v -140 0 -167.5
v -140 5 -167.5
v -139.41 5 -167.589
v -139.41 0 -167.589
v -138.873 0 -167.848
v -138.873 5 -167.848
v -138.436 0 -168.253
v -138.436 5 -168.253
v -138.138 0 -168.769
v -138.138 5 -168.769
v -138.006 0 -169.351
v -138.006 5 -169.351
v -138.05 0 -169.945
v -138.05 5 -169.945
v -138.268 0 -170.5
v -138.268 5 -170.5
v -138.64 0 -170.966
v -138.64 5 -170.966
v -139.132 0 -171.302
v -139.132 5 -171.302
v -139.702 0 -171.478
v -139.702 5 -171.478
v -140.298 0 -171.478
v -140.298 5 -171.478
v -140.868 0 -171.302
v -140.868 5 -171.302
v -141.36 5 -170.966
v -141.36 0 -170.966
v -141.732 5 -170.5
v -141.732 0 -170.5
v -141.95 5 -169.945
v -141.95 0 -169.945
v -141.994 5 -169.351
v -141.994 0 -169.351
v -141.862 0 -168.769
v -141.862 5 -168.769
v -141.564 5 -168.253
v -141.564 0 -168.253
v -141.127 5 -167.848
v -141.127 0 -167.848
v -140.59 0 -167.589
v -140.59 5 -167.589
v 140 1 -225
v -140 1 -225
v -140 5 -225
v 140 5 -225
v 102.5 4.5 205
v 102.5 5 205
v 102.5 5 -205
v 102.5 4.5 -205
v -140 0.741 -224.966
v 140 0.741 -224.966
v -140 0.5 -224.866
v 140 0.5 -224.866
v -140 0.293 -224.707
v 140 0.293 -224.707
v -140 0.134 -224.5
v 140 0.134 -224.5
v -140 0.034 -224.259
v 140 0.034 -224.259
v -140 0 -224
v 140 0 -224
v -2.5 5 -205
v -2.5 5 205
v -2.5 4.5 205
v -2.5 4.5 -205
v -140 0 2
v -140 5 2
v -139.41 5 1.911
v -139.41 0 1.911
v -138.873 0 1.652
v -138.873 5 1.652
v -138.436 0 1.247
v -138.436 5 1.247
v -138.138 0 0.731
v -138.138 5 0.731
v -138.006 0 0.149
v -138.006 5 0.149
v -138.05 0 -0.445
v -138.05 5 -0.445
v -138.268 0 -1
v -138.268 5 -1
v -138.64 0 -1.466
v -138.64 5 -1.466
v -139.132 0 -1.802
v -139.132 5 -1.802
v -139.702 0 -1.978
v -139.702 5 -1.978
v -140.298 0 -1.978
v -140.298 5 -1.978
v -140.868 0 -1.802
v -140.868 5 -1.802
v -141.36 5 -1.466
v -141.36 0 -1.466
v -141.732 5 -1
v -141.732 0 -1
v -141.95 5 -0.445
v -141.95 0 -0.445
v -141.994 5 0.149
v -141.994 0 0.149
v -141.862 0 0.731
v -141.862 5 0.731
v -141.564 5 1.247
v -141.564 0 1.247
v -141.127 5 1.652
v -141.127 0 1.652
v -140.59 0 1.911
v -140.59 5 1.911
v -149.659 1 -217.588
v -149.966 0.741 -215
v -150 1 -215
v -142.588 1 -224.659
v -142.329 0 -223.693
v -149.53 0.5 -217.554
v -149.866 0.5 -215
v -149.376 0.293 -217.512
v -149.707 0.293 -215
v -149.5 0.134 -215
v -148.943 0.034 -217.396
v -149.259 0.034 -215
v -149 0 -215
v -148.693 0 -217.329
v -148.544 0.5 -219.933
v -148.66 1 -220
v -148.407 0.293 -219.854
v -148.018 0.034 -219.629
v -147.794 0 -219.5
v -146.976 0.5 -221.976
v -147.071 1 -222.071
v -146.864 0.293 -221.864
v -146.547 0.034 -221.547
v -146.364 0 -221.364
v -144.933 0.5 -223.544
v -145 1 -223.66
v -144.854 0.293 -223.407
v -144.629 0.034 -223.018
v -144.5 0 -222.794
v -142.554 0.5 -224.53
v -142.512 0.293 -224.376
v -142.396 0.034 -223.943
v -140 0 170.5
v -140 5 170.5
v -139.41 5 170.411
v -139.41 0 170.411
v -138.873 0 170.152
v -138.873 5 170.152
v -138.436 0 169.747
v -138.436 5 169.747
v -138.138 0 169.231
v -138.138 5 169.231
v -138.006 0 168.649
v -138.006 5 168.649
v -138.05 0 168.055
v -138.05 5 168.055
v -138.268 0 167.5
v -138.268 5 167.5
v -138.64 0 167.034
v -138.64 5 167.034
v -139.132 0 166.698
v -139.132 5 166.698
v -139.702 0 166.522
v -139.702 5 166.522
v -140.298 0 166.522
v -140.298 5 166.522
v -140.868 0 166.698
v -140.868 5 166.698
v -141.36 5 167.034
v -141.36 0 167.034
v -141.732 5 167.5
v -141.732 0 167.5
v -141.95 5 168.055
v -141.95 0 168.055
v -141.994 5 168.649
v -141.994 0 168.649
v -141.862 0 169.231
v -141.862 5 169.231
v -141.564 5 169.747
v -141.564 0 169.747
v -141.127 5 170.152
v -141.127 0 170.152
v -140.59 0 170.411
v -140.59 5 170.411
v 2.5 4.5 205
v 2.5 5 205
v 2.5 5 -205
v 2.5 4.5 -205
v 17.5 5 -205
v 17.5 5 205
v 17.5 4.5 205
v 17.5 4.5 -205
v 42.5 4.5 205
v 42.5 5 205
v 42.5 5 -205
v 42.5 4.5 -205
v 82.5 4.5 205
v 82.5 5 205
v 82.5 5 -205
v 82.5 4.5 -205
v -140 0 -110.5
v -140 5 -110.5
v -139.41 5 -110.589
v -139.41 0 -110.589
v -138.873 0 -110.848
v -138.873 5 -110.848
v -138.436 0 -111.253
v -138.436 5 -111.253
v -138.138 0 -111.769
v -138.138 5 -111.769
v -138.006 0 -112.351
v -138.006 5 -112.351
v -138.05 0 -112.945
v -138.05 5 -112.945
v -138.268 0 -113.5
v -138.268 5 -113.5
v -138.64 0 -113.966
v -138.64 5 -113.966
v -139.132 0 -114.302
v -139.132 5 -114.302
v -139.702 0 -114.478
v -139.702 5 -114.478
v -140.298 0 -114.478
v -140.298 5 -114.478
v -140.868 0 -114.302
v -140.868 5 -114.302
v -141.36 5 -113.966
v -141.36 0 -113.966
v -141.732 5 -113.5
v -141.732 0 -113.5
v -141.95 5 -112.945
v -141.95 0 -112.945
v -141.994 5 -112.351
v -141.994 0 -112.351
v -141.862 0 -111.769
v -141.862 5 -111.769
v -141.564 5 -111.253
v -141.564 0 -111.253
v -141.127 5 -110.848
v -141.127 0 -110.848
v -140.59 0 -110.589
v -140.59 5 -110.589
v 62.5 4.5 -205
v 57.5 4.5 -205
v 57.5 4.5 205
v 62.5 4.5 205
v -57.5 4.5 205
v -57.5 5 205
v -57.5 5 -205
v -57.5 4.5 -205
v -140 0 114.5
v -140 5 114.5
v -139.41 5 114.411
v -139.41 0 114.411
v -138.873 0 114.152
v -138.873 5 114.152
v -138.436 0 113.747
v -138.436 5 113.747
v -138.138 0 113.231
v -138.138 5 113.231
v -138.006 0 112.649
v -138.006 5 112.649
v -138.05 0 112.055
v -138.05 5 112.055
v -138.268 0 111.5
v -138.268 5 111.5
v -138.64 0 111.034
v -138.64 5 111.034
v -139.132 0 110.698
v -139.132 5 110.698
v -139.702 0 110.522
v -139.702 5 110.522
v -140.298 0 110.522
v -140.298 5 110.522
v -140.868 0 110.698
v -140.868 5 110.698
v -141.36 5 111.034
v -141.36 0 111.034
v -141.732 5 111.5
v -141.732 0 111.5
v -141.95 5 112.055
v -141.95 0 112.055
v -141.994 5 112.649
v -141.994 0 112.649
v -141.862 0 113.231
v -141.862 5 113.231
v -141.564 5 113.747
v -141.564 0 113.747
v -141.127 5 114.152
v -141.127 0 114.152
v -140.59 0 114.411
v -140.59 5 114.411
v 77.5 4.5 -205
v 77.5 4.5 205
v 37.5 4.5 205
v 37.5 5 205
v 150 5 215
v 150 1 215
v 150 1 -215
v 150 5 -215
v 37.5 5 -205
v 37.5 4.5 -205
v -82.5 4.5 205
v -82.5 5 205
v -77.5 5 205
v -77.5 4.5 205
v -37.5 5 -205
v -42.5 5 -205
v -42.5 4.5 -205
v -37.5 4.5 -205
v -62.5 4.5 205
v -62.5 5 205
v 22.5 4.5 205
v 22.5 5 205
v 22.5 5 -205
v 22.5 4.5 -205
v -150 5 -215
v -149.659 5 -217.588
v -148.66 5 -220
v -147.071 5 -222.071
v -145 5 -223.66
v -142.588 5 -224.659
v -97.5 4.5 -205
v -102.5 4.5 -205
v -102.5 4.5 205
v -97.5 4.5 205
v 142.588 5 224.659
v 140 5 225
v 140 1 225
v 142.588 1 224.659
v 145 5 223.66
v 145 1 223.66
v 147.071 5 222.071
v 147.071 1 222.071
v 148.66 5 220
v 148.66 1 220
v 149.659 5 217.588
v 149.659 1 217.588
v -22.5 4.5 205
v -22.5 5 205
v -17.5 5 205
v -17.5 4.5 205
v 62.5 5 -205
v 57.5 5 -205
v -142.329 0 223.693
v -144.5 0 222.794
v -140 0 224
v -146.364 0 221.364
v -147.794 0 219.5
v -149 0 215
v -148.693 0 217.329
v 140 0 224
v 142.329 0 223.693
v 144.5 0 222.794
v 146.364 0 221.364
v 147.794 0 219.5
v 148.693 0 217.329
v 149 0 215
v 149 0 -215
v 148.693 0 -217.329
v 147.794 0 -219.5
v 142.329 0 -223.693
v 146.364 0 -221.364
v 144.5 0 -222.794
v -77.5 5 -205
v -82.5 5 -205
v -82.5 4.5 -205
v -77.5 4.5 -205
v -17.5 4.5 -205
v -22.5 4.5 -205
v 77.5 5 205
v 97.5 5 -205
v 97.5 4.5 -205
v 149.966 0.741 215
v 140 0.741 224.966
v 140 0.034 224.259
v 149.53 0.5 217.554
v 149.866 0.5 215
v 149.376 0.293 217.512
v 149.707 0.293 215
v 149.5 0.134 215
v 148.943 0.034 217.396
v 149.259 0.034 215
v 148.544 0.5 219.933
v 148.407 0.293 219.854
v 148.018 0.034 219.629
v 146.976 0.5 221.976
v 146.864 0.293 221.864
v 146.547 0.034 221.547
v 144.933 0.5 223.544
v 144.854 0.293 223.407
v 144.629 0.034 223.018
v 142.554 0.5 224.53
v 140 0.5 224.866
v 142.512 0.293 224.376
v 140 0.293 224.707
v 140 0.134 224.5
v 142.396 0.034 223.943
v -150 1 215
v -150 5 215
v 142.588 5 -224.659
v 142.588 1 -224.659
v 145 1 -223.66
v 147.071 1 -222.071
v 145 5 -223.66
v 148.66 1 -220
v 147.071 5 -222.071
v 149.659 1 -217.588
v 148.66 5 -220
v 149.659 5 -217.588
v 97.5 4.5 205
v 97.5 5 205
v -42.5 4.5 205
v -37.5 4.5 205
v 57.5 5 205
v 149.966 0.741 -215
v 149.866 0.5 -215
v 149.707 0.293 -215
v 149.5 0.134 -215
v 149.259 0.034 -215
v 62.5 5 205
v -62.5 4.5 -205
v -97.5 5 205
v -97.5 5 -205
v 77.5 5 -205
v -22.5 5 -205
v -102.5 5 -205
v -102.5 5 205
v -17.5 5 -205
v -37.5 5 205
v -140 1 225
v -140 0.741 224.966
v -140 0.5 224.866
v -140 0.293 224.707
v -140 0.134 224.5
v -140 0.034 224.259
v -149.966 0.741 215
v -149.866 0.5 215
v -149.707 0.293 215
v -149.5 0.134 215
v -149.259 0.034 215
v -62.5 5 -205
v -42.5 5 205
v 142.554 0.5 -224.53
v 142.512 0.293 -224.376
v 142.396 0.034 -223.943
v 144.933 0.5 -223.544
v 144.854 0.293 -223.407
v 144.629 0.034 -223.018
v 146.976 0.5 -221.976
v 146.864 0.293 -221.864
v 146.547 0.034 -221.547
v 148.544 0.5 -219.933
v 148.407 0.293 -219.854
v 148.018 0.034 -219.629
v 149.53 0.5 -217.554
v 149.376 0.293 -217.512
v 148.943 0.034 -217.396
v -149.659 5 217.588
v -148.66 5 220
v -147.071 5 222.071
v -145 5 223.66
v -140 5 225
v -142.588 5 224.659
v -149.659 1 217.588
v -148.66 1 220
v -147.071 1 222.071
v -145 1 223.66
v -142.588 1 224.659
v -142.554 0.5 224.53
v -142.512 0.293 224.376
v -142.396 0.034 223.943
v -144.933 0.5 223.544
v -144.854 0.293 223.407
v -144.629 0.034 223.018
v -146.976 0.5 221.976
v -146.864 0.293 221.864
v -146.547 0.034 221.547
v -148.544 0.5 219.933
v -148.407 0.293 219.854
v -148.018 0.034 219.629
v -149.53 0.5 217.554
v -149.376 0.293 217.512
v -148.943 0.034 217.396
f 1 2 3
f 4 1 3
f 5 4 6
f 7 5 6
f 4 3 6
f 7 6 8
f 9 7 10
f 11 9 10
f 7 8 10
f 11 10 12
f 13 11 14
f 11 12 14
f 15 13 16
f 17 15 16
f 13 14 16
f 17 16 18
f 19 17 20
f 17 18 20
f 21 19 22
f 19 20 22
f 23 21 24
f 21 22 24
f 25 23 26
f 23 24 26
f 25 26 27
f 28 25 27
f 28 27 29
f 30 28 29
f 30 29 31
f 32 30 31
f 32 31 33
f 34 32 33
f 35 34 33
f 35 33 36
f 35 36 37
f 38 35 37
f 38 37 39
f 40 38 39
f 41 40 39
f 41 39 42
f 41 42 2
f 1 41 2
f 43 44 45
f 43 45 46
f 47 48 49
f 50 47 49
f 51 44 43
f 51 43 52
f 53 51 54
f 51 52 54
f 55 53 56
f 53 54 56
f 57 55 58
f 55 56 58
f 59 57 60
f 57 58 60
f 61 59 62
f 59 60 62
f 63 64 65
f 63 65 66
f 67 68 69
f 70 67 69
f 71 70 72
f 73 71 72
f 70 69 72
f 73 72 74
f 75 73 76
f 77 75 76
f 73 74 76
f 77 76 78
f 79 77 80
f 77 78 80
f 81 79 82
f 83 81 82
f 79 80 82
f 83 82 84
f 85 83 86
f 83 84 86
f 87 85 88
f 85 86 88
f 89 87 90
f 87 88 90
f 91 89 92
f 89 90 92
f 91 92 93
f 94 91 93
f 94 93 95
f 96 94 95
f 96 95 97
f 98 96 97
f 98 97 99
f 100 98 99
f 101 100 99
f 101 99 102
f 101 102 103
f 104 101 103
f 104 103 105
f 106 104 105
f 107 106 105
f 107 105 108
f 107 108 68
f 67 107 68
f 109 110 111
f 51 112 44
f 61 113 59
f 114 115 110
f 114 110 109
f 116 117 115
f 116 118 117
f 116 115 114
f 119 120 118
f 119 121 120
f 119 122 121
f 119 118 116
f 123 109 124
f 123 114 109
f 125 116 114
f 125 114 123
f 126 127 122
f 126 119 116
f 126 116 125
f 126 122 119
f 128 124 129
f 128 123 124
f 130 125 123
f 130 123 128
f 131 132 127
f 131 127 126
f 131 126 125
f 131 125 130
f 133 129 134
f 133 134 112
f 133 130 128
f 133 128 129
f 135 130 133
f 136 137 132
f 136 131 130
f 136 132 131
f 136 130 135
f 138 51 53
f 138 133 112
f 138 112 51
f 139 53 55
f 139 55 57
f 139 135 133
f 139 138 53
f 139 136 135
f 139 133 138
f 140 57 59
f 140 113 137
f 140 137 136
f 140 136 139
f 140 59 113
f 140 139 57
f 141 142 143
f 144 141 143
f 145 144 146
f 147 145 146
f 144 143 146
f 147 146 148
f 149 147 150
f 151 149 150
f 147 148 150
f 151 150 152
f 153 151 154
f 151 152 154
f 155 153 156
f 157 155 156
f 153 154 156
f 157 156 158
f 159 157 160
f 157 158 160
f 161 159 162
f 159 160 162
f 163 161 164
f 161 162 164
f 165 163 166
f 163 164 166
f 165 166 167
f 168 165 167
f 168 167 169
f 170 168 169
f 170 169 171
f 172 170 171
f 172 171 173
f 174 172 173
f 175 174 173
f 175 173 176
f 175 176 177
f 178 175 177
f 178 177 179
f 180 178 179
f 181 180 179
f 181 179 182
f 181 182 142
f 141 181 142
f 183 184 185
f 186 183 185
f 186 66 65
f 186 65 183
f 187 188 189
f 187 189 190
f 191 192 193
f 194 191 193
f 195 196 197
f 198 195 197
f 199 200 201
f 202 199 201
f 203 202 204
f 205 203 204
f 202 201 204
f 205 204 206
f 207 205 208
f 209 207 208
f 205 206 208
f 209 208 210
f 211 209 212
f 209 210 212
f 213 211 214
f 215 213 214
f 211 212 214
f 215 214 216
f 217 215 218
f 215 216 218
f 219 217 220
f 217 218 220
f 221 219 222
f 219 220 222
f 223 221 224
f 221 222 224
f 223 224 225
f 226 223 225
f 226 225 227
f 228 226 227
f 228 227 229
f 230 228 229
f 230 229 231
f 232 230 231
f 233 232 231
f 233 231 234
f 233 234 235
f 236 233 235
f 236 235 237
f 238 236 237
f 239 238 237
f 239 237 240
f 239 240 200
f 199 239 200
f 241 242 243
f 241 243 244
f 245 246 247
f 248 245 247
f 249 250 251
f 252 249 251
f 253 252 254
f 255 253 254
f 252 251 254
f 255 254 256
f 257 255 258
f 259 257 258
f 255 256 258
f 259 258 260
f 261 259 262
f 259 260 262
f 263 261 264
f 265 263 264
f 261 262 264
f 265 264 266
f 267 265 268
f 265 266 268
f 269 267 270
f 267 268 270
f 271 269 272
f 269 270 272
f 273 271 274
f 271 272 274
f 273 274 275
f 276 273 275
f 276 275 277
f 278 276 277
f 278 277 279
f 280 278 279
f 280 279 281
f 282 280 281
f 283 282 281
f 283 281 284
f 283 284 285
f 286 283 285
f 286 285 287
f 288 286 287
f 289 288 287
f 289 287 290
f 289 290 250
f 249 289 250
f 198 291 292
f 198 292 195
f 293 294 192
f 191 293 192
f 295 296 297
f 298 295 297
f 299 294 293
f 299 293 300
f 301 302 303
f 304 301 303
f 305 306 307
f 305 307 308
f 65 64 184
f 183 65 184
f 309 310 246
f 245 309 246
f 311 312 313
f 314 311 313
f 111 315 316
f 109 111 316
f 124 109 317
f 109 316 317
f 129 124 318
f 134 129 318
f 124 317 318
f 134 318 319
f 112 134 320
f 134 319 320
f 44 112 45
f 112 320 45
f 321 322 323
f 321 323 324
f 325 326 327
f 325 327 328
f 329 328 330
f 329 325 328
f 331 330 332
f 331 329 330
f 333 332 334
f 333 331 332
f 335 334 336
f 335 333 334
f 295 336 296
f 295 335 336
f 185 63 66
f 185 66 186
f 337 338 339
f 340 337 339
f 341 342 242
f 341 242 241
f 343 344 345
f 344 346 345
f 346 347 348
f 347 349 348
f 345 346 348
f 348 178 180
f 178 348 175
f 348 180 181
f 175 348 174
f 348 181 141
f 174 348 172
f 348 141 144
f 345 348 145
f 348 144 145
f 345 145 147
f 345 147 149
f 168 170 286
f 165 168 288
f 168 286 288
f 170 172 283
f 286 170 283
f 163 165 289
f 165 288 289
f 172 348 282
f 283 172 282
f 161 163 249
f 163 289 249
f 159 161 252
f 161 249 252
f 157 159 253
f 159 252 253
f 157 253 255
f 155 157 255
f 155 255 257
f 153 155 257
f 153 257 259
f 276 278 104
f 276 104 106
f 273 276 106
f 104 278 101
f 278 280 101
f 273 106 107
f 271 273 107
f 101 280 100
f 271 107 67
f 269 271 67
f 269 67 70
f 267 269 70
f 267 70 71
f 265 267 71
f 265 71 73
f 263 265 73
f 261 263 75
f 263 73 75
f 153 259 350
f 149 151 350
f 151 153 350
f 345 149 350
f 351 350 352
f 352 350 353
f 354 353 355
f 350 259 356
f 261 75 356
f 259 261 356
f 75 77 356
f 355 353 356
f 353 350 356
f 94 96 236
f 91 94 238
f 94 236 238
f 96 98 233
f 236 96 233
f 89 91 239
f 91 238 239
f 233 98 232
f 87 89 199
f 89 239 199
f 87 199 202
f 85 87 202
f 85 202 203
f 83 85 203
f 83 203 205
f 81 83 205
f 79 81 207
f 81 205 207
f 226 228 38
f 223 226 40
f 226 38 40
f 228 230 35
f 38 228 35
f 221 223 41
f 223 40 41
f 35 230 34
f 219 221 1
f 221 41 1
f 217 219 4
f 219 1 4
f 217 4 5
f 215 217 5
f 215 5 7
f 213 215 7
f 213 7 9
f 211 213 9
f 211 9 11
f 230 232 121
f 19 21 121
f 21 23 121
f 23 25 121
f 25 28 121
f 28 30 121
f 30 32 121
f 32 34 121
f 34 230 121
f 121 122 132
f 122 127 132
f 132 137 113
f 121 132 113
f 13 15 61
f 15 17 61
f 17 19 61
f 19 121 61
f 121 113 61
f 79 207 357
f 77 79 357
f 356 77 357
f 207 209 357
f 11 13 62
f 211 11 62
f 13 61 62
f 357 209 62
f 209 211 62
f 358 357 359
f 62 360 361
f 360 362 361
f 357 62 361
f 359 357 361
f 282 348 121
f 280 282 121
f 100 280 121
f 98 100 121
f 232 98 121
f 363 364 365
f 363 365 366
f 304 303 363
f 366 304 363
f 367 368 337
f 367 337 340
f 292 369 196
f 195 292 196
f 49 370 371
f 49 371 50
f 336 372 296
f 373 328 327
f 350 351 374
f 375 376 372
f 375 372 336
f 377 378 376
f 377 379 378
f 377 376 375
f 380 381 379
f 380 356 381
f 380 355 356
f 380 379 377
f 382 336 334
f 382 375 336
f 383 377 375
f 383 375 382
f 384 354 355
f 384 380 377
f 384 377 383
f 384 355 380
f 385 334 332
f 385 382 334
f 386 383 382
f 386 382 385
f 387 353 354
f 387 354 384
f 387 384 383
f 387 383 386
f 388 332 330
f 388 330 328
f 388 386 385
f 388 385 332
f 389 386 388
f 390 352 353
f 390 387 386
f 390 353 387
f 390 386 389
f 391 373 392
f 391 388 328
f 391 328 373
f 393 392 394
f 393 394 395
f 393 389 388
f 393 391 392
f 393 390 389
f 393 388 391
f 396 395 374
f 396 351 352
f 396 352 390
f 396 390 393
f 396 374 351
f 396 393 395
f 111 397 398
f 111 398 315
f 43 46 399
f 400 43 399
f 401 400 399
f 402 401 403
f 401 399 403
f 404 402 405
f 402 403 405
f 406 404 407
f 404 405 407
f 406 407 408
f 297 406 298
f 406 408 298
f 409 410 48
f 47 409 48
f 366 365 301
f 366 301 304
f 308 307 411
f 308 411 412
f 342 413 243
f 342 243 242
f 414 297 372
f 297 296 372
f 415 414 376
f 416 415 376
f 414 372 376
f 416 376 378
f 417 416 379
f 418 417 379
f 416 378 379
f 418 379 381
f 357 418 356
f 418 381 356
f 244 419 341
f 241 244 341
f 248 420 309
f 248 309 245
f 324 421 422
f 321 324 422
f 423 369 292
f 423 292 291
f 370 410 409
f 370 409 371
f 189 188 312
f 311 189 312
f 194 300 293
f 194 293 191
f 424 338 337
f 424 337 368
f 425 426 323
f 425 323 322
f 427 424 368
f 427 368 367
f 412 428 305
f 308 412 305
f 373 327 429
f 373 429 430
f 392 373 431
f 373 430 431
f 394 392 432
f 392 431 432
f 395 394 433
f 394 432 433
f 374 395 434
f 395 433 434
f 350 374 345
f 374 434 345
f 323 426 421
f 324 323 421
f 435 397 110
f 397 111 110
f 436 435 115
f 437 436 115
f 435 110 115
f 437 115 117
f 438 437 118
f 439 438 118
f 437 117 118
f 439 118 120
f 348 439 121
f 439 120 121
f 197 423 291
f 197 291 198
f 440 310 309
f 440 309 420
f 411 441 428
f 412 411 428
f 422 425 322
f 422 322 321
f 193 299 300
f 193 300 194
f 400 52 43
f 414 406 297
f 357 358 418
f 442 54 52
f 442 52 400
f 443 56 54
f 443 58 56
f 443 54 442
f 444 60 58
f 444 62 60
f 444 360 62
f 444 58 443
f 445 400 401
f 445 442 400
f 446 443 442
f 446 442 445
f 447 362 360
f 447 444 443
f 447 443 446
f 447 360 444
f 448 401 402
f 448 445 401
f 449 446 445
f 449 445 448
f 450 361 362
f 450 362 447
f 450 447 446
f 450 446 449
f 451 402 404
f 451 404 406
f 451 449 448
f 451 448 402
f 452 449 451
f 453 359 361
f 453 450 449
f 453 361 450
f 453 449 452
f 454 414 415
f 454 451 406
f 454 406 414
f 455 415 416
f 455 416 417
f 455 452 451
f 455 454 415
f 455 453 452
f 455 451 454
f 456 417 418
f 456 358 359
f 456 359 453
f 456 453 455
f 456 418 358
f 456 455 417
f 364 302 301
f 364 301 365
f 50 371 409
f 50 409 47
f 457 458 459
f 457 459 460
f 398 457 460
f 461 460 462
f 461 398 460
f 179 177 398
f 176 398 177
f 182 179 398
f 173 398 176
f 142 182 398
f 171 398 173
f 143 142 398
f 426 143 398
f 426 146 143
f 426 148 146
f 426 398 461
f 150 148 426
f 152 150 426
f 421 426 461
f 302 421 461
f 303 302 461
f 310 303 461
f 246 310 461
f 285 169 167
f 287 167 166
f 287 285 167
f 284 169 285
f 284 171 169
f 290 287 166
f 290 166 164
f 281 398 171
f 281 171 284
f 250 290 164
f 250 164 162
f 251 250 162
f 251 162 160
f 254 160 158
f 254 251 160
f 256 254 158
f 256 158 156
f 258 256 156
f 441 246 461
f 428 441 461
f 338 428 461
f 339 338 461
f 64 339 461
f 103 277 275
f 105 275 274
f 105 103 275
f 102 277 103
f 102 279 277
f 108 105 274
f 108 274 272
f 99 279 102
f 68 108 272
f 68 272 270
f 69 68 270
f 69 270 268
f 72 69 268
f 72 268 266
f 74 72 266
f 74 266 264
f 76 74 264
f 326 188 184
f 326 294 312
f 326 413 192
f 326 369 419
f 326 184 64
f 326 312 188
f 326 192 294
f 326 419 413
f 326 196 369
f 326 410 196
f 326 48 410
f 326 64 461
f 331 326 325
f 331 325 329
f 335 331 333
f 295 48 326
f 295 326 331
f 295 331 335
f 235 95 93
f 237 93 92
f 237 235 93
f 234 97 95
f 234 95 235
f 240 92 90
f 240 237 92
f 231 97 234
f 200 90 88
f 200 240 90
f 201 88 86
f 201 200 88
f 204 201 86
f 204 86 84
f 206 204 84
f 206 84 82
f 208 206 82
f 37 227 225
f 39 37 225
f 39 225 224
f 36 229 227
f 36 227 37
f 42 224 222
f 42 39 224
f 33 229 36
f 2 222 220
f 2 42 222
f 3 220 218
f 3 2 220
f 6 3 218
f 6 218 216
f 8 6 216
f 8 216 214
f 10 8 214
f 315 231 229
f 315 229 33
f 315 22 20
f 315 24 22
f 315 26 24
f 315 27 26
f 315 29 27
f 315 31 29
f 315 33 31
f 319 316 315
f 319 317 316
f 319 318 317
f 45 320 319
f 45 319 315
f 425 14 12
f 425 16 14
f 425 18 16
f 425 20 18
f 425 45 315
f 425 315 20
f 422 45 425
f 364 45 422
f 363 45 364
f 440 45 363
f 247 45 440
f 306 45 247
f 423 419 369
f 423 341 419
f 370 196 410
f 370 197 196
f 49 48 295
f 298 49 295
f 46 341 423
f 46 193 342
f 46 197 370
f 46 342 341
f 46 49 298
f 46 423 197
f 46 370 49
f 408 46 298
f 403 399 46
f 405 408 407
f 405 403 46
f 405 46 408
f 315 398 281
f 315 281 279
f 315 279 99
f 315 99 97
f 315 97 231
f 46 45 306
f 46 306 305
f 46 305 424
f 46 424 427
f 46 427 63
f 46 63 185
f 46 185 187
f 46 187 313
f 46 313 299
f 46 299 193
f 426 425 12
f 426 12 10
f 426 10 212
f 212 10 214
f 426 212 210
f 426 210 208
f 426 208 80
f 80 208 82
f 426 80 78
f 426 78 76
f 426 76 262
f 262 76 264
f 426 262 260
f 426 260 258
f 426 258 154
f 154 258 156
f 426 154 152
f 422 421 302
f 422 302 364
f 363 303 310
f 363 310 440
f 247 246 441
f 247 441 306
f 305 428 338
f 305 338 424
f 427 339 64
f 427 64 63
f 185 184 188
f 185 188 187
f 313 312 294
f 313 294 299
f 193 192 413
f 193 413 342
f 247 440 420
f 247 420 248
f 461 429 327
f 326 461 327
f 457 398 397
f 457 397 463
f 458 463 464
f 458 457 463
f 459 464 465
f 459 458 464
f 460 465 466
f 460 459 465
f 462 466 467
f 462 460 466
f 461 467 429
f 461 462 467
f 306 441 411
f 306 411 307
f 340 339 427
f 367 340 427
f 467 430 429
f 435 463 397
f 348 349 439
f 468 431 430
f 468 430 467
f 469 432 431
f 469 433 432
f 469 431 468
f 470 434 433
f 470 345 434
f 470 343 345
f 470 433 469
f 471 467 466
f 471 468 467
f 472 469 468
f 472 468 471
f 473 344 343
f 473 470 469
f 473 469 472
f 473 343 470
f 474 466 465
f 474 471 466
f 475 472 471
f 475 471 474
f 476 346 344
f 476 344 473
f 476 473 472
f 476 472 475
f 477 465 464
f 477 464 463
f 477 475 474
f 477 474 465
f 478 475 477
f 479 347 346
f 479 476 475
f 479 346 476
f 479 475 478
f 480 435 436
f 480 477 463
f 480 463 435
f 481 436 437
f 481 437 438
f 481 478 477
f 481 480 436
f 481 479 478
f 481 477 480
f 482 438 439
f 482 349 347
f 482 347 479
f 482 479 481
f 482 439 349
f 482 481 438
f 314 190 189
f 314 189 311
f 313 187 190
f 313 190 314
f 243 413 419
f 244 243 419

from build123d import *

# Parameters (mm, degrees)
SKETCH1_W           = 300
SKETCH1_H           = 450
BOSS_EXTRUDE1_DEPTH = 5
SKETCH2_R           = 2
CUT_EXTRUDE1_DEPTH  = 271.462566726
FILLET2_R           = 10
FILLET1_R           = 1
SKETCH3_W           = 5
SKETCH3_H           = 410
CUT_EXTRUDE2_DEPTH  = 0.5


with BuildPart() as part:
    # Sketch1 → Boss-Extrude1 (new body)
    with BuildSketch(Plane(origin=(0, 0, 0), x_dir=(1, 0, 0), z_dir=(0, 1, 0))):
        Rectangle(SKETCH1_W, SKETCH1_H)
    extrude(amount=BOSS_EXTRUDE1_DEPTH)

    # Sketch2 → Cut-Extrude1 (cut, through all)
    with BuildSketch(Plane(origin=(0, 5, 0), x_dir=(1, 0, 0), z_dir=(0, 1, 0))):
        with Locations(Location((-140, 0, 0), (0, 0, 270))):
            Circle(SKETCH2_R)
        with Locations(Location((-140, 112.5, 0), (0, 0, 270))):
            Circle(SKETCH2_R)
        with Locations(Location((-140, -112.5, 0), (0, 0, 270))):
            Circle(SKETCH2_R)
        with Locations(Location((-140, 169.5, 0), (0, 0, 270))):
            Circle(SKETCH2_R)
        with Locations(Location((-140, -168.5, 0), (0, 0, 270))):
            Circle(SKETCH2_R)
    extrude(amount=-CUT_EXTRUDE1_DEPTH, mode=Mode.SUBTRACT)

    # Fillet2
    fillet2_edges = [part.edges().sort_by_distance(p)[0] for p in [
        (150, 2.5, 225),
        (-150, 2.5, 225),
        (-150, 2.5, -225),
        (150, 2.5, -225),
    ]]
    fillet(fillet2_edges, radius=FILLET2_R)

    # Fillet1
    fillet1_edges = [part.edges().sort_by_distance(p)[0] for p in [
        (-150, 0, 0),
        (150, 0, 0),
        (0, 0, 225),
        (0, 0, -225),
        (-147.071067812, 0, 222.071067812),
        (147.071067812, 0, 222.071067812),
        (147.071067812, 0, -222.071067812),
        (-147.071067812, 0, -222.071067812),
    ]]
    fillet(fillet1_edges, radius=FILLET1_R)

    # Sketch3 → Cut-Extrude2 (cut)
    with BuildSketch(Plane(origin=(0, 5, 0), x_dir=(1, 0, 0), z_dir=(0, 1, 0))):
        with Locations((20, 0)):
            Rectangle(SKETCH3_W, SKETCH3_H)
        Rectangle(SKETCH3_W, SKETCH3_H)
        with Locations((40, 0)):
            Rectangle(SKETCH3_W, SKETCH3_H)
        with Locations((60, 0)):
            Rectangle(SKETCH3_W, SKETCH3_H)
        with Locations((80, 0)):
            Rectangle(SKETCH3_W, SKETCH3_H)
        with Locations((100, 0)):
            Rectangle(SKETCH3_W, SKETCH3_H)
        with Locations((-20, 0)):
            Rectangle(SKETCH3_W, SKETCH3_H)
        with Locations((-40, 0)):
            Rectangle(SKETCH3_W, SKETCH3_H)
        with Locations((-60, 0)):
            Rectangle(SKETCH3_W, SKETCH3_H)
        with Locations((-80, 0)):
            Rectangle(SKETCH3_W, SKETCH3_H)
        with Locations((-100, 0)):
            Rectangle(SKETCH3_W, SKETCH3_H)
    extrude(amount=-CUT_EXTRUDE2_DEPTH, mode=Mode.SUBTRACT)


solid = part.part
